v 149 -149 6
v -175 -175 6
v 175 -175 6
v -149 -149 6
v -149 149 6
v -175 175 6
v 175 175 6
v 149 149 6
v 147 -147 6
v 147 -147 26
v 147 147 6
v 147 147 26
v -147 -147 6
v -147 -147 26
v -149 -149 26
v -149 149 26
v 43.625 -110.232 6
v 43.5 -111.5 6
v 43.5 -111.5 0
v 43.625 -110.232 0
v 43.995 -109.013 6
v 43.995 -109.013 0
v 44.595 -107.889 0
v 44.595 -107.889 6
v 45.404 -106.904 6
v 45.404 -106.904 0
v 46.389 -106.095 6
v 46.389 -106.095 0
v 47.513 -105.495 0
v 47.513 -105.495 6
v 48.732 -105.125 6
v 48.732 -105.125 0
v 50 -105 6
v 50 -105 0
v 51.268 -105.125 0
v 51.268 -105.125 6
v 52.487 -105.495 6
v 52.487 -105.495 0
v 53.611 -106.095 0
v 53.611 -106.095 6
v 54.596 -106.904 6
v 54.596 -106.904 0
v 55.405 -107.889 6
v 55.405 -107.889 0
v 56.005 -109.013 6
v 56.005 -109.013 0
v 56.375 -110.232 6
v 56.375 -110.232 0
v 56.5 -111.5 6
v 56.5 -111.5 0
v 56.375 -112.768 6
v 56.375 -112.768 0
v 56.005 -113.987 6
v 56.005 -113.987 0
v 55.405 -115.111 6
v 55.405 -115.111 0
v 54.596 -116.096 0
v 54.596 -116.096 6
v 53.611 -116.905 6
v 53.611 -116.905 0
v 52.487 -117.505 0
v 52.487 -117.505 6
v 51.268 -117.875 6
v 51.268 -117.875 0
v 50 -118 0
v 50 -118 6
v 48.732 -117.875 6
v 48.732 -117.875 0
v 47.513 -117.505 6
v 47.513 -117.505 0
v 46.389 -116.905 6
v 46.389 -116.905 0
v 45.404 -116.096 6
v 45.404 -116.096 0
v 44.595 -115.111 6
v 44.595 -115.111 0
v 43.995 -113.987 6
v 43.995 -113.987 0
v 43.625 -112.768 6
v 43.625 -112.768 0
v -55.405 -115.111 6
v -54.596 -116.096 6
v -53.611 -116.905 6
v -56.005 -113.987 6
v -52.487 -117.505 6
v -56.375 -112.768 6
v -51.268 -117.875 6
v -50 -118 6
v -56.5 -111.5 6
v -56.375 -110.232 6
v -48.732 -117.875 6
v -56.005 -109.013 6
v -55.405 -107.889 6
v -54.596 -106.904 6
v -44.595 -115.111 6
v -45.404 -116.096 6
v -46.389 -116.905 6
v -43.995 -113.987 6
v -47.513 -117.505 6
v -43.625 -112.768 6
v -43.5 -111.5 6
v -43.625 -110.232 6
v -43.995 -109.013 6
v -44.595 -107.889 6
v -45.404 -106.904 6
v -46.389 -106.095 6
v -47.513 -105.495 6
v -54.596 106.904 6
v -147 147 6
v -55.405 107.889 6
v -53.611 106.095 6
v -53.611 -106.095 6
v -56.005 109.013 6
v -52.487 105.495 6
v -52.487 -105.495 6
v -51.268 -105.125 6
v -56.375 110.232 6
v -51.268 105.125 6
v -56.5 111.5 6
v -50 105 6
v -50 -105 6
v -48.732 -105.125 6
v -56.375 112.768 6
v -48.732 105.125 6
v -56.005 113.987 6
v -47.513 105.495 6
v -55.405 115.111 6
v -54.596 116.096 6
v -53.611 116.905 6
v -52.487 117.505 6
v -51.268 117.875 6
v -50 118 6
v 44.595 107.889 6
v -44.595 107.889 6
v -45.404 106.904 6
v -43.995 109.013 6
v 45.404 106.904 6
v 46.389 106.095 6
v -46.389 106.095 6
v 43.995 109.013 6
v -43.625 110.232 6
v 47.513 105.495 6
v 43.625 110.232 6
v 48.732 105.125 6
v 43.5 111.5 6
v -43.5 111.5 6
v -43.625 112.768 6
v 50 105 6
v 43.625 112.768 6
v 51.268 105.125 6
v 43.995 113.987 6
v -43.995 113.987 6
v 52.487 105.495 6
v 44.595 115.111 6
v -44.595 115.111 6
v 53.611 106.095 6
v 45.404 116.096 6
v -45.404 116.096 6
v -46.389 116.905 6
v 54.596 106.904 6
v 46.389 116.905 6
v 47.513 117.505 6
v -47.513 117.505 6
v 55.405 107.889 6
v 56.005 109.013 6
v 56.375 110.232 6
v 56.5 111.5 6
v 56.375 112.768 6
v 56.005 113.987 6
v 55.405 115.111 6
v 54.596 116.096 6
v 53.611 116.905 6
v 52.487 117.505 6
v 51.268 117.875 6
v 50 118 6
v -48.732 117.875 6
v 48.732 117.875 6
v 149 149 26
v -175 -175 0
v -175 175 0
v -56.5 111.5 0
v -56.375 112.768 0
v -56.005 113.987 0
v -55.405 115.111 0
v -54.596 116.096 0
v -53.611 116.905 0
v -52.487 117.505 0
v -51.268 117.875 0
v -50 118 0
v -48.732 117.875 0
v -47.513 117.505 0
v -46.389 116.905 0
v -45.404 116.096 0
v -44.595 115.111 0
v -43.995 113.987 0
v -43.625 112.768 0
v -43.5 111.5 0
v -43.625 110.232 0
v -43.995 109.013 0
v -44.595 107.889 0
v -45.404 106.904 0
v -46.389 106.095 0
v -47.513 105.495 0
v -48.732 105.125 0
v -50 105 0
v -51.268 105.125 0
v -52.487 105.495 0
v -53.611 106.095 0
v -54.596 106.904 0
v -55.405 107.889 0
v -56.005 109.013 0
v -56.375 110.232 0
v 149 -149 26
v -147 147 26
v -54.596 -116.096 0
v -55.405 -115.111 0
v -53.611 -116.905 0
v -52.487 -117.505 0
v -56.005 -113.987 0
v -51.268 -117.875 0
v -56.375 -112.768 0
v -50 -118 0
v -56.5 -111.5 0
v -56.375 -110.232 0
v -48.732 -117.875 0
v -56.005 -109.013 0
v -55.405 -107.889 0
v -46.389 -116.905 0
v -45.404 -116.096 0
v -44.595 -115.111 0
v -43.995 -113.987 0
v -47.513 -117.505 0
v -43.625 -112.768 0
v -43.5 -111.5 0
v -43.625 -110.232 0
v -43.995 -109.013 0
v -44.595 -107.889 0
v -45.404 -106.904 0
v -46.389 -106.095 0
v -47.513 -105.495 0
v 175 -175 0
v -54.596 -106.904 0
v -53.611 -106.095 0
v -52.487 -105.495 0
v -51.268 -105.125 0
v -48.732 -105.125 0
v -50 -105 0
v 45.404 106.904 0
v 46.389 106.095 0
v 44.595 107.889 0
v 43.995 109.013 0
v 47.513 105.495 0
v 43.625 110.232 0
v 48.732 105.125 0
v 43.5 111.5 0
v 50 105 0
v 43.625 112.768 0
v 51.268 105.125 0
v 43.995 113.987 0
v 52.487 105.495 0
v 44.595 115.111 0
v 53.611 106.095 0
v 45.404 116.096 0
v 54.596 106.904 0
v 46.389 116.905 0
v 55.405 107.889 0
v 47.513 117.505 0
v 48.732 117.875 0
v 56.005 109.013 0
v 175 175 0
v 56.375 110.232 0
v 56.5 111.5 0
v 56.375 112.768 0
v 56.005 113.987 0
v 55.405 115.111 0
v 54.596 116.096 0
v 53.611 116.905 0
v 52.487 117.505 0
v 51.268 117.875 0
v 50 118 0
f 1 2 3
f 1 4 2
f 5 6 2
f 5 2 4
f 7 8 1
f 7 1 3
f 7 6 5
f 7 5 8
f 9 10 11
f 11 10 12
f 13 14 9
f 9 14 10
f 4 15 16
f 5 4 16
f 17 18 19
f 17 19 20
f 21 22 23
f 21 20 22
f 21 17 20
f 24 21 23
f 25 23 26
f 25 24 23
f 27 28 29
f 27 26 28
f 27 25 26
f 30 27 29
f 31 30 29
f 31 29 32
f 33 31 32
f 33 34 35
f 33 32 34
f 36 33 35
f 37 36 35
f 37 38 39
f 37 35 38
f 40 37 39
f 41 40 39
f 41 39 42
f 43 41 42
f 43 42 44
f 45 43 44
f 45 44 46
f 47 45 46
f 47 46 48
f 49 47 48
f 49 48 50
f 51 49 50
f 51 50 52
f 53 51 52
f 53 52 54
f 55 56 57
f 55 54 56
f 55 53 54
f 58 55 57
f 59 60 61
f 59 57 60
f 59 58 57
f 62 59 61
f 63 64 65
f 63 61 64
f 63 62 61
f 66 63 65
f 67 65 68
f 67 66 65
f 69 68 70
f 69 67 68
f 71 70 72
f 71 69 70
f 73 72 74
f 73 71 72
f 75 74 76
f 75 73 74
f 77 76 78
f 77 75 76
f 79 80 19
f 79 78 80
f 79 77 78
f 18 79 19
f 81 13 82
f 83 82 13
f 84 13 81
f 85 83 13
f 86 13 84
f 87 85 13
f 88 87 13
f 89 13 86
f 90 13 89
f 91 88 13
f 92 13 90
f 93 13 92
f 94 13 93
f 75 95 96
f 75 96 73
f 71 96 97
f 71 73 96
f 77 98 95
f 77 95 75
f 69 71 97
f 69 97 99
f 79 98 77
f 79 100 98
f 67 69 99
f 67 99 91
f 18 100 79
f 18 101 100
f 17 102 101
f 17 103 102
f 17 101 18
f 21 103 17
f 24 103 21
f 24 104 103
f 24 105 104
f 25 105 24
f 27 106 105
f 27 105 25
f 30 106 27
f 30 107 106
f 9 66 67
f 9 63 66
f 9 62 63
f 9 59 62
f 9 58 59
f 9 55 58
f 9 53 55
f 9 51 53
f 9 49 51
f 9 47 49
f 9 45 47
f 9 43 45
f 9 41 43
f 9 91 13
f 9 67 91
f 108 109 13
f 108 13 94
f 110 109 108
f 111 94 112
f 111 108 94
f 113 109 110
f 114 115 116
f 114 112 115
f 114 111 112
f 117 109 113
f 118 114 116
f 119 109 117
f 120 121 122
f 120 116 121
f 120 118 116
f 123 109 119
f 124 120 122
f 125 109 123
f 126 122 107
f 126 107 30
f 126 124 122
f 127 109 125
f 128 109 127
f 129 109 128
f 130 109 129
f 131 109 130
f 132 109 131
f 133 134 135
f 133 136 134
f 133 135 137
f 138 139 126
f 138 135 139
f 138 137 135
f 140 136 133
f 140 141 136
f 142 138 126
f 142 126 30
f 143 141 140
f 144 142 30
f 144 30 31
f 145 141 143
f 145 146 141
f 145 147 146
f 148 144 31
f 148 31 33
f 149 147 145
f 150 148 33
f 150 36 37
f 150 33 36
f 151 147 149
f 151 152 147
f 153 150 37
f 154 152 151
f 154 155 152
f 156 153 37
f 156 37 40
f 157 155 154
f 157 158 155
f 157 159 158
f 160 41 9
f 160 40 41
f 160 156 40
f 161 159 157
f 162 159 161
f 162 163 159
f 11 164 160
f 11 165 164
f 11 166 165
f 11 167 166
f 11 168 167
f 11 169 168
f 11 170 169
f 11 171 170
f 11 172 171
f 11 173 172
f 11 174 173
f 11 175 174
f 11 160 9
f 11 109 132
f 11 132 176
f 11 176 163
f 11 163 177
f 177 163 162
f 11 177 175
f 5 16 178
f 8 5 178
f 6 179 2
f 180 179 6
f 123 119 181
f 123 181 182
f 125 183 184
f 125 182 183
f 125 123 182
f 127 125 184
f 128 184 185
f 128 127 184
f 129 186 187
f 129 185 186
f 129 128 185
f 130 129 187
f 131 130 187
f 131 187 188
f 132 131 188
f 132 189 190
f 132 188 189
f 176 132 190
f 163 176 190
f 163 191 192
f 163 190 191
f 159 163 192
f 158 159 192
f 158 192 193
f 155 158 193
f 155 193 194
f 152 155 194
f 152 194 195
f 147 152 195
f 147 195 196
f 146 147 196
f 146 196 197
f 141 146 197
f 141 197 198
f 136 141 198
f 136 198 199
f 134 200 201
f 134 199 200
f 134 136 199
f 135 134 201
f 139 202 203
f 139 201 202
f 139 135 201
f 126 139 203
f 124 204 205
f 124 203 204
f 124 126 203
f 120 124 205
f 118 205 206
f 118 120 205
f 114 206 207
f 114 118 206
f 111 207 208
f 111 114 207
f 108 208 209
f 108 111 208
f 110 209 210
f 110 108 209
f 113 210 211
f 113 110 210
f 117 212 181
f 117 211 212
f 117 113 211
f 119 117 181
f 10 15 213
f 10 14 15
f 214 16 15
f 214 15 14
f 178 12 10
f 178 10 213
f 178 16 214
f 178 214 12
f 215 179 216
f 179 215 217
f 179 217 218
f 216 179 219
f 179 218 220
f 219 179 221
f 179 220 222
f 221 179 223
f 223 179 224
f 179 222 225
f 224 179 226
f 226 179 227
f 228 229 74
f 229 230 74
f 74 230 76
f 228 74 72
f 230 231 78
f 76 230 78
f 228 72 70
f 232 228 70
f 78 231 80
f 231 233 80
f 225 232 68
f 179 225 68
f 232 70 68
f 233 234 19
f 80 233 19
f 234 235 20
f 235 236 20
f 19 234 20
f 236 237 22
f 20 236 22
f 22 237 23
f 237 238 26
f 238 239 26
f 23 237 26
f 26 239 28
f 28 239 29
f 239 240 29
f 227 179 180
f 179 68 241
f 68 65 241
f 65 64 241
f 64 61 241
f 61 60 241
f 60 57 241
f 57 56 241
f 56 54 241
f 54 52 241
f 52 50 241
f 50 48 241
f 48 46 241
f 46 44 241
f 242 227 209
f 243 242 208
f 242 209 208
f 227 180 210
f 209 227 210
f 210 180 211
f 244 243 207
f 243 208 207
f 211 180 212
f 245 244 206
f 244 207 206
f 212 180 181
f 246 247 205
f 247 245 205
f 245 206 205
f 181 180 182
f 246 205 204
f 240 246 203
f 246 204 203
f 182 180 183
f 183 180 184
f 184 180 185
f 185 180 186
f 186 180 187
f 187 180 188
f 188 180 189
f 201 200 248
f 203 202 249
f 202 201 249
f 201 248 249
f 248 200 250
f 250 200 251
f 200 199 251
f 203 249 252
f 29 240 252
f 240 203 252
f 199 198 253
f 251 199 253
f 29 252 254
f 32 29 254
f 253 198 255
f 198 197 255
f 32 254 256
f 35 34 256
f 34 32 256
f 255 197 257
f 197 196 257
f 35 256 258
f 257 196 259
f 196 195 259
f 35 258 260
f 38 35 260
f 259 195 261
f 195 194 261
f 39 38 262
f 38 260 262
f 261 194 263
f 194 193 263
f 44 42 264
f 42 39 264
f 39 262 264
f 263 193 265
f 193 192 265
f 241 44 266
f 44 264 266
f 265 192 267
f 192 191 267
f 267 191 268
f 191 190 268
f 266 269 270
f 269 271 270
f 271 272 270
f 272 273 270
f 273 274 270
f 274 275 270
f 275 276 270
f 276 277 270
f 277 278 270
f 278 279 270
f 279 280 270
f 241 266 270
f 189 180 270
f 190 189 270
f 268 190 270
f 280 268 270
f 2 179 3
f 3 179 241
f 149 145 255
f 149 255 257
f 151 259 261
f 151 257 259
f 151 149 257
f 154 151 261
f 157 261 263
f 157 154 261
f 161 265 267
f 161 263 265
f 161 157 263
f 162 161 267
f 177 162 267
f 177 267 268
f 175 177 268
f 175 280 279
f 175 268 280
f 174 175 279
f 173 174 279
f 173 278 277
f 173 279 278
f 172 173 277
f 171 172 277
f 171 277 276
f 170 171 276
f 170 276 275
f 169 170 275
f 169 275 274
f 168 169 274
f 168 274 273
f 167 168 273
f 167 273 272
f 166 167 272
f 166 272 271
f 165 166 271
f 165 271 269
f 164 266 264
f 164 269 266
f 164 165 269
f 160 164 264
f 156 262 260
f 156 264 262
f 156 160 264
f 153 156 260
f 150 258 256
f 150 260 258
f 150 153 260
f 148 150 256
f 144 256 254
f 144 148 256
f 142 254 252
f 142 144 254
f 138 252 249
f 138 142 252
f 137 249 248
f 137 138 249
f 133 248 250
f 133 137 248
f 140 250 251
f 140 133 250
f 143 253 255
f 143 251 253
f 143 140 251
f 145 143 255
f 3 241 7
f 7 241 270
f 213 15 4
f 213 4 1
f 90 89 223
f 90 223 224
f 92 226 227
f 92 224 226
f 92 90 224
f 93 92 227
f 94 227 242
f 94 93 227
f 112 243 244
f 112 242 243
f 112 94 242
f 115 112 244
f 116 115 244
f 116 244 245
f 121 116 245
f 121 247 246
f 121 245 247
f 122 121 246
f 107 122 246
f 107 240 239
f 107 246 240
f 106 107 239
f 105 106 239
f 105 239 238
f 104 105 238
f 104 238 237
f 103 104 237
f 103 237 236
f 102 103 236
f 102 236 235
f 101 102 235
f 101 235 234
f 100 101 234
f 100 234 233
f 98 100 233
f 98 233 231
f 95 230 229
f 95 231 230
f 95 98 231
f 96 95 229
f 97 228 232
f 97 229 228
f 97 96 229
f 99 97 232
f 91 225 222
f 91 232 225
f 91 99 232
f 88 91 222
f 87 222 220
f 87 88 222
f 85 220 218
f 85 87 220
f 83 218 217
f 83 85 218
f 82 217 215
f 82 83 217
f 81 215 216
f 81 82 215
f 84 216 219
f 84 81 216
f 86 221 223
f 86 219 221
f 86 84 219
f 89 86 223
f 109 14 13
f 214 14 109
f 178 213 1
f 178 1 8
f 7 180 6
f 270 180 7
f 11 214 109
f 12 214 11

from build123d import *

# Parameters (mm, degrees)
ESQUISSE1_W                  = 350
ESQUISSE1_H                  = 350
BOSS_EXTRU_1_DEPTH           = 26
ESQUISSE2_W                  = 350
ESQUISSE2_H                  = 350
ESQUISSE2_W_2                = 298
ESQUISSE2_H_2                = 298
ENL_V_MAT_EXTRU_1_DEPTH      = 20
ESQUISSE3_W                  = 294
ESQUISSE3_H                  = 294
ENL_V_MAT_EXTRU_2_DEPTH      = 20
ENL_V_MAT_EXTRU_3_DEPTH      = 249.849352018
ENL_V_MAT_EXTRU_3_DEPTH_BACK = 249.849352018
ESQUISSE5_R                  = 6.5


with BuildPart() as part:
    # Esquisse1 → Boss.-Extru.1 (new body)
    with BuildSketch(Plane.XY):
        Rectangle(ESQUISSE1_W, ESQUISSE1_H)
    extrude(amount=BOSS_EXTRU_1_DEPTH)

    # Esquisse2 → Enlèv. mat.-Extru.1 (cut)
    with BuildSketch(Plane.XY.offset(26)):
        Rectangle(ESQUISSE2_W, ESQUISSE2_H)
        Rectangle(ESQUISSE2_W_2, ESQUISSE2_H_2, mode=Mode.SUBTRACT)
    extrude(amount=-ENL_V_MAT_EXTRU_1_DEPTH, mode=Mode.SUBTRACT)

    # Esquisse3 → Enlèv. mat.-Extru.2 (cut)
    with BuildSketch(Plane.XY.offset(26)):
        Rectangle(ESQUISSE3_W, ESQUISSE3_H)
    extrude(amount=-ENL_V_MAT_EXTRU_2_DEPTH, mode=Mode.SUBTRACT)

    # Esquisse5 → Enlèv. mat.-Extru.3 (cut, two sides: drawn at the far end of the back side and taken through both)
    with BuildSketch(Plane(origin=(0, 0, 0), x_dir=(-1, 0, 0), z_dir=(0, 0, -1)).offset(-ENL_V_MAT_EXTRU_3_DEPTH_BACK)):
        with Locations((-50, 111.5)):
            Circle(ESQUISSE5_R)
        with Locations((50, 111.5)):
            Circle(ESQUISSE5_R)
        with Locations((50, -111.5)):
            Circle(ESQUISSE5_R)
        with Locations((-50, -111.5)):
            Circle(ESQUISSE5_R)
    extrude(amount=ENL_V_MAT_EXTRU_3_DEPTH + ENL_V_MAT_EXTRU_3_DEPTH_BACK, mode=Mode.SUBTRACT)


solid = part.part
